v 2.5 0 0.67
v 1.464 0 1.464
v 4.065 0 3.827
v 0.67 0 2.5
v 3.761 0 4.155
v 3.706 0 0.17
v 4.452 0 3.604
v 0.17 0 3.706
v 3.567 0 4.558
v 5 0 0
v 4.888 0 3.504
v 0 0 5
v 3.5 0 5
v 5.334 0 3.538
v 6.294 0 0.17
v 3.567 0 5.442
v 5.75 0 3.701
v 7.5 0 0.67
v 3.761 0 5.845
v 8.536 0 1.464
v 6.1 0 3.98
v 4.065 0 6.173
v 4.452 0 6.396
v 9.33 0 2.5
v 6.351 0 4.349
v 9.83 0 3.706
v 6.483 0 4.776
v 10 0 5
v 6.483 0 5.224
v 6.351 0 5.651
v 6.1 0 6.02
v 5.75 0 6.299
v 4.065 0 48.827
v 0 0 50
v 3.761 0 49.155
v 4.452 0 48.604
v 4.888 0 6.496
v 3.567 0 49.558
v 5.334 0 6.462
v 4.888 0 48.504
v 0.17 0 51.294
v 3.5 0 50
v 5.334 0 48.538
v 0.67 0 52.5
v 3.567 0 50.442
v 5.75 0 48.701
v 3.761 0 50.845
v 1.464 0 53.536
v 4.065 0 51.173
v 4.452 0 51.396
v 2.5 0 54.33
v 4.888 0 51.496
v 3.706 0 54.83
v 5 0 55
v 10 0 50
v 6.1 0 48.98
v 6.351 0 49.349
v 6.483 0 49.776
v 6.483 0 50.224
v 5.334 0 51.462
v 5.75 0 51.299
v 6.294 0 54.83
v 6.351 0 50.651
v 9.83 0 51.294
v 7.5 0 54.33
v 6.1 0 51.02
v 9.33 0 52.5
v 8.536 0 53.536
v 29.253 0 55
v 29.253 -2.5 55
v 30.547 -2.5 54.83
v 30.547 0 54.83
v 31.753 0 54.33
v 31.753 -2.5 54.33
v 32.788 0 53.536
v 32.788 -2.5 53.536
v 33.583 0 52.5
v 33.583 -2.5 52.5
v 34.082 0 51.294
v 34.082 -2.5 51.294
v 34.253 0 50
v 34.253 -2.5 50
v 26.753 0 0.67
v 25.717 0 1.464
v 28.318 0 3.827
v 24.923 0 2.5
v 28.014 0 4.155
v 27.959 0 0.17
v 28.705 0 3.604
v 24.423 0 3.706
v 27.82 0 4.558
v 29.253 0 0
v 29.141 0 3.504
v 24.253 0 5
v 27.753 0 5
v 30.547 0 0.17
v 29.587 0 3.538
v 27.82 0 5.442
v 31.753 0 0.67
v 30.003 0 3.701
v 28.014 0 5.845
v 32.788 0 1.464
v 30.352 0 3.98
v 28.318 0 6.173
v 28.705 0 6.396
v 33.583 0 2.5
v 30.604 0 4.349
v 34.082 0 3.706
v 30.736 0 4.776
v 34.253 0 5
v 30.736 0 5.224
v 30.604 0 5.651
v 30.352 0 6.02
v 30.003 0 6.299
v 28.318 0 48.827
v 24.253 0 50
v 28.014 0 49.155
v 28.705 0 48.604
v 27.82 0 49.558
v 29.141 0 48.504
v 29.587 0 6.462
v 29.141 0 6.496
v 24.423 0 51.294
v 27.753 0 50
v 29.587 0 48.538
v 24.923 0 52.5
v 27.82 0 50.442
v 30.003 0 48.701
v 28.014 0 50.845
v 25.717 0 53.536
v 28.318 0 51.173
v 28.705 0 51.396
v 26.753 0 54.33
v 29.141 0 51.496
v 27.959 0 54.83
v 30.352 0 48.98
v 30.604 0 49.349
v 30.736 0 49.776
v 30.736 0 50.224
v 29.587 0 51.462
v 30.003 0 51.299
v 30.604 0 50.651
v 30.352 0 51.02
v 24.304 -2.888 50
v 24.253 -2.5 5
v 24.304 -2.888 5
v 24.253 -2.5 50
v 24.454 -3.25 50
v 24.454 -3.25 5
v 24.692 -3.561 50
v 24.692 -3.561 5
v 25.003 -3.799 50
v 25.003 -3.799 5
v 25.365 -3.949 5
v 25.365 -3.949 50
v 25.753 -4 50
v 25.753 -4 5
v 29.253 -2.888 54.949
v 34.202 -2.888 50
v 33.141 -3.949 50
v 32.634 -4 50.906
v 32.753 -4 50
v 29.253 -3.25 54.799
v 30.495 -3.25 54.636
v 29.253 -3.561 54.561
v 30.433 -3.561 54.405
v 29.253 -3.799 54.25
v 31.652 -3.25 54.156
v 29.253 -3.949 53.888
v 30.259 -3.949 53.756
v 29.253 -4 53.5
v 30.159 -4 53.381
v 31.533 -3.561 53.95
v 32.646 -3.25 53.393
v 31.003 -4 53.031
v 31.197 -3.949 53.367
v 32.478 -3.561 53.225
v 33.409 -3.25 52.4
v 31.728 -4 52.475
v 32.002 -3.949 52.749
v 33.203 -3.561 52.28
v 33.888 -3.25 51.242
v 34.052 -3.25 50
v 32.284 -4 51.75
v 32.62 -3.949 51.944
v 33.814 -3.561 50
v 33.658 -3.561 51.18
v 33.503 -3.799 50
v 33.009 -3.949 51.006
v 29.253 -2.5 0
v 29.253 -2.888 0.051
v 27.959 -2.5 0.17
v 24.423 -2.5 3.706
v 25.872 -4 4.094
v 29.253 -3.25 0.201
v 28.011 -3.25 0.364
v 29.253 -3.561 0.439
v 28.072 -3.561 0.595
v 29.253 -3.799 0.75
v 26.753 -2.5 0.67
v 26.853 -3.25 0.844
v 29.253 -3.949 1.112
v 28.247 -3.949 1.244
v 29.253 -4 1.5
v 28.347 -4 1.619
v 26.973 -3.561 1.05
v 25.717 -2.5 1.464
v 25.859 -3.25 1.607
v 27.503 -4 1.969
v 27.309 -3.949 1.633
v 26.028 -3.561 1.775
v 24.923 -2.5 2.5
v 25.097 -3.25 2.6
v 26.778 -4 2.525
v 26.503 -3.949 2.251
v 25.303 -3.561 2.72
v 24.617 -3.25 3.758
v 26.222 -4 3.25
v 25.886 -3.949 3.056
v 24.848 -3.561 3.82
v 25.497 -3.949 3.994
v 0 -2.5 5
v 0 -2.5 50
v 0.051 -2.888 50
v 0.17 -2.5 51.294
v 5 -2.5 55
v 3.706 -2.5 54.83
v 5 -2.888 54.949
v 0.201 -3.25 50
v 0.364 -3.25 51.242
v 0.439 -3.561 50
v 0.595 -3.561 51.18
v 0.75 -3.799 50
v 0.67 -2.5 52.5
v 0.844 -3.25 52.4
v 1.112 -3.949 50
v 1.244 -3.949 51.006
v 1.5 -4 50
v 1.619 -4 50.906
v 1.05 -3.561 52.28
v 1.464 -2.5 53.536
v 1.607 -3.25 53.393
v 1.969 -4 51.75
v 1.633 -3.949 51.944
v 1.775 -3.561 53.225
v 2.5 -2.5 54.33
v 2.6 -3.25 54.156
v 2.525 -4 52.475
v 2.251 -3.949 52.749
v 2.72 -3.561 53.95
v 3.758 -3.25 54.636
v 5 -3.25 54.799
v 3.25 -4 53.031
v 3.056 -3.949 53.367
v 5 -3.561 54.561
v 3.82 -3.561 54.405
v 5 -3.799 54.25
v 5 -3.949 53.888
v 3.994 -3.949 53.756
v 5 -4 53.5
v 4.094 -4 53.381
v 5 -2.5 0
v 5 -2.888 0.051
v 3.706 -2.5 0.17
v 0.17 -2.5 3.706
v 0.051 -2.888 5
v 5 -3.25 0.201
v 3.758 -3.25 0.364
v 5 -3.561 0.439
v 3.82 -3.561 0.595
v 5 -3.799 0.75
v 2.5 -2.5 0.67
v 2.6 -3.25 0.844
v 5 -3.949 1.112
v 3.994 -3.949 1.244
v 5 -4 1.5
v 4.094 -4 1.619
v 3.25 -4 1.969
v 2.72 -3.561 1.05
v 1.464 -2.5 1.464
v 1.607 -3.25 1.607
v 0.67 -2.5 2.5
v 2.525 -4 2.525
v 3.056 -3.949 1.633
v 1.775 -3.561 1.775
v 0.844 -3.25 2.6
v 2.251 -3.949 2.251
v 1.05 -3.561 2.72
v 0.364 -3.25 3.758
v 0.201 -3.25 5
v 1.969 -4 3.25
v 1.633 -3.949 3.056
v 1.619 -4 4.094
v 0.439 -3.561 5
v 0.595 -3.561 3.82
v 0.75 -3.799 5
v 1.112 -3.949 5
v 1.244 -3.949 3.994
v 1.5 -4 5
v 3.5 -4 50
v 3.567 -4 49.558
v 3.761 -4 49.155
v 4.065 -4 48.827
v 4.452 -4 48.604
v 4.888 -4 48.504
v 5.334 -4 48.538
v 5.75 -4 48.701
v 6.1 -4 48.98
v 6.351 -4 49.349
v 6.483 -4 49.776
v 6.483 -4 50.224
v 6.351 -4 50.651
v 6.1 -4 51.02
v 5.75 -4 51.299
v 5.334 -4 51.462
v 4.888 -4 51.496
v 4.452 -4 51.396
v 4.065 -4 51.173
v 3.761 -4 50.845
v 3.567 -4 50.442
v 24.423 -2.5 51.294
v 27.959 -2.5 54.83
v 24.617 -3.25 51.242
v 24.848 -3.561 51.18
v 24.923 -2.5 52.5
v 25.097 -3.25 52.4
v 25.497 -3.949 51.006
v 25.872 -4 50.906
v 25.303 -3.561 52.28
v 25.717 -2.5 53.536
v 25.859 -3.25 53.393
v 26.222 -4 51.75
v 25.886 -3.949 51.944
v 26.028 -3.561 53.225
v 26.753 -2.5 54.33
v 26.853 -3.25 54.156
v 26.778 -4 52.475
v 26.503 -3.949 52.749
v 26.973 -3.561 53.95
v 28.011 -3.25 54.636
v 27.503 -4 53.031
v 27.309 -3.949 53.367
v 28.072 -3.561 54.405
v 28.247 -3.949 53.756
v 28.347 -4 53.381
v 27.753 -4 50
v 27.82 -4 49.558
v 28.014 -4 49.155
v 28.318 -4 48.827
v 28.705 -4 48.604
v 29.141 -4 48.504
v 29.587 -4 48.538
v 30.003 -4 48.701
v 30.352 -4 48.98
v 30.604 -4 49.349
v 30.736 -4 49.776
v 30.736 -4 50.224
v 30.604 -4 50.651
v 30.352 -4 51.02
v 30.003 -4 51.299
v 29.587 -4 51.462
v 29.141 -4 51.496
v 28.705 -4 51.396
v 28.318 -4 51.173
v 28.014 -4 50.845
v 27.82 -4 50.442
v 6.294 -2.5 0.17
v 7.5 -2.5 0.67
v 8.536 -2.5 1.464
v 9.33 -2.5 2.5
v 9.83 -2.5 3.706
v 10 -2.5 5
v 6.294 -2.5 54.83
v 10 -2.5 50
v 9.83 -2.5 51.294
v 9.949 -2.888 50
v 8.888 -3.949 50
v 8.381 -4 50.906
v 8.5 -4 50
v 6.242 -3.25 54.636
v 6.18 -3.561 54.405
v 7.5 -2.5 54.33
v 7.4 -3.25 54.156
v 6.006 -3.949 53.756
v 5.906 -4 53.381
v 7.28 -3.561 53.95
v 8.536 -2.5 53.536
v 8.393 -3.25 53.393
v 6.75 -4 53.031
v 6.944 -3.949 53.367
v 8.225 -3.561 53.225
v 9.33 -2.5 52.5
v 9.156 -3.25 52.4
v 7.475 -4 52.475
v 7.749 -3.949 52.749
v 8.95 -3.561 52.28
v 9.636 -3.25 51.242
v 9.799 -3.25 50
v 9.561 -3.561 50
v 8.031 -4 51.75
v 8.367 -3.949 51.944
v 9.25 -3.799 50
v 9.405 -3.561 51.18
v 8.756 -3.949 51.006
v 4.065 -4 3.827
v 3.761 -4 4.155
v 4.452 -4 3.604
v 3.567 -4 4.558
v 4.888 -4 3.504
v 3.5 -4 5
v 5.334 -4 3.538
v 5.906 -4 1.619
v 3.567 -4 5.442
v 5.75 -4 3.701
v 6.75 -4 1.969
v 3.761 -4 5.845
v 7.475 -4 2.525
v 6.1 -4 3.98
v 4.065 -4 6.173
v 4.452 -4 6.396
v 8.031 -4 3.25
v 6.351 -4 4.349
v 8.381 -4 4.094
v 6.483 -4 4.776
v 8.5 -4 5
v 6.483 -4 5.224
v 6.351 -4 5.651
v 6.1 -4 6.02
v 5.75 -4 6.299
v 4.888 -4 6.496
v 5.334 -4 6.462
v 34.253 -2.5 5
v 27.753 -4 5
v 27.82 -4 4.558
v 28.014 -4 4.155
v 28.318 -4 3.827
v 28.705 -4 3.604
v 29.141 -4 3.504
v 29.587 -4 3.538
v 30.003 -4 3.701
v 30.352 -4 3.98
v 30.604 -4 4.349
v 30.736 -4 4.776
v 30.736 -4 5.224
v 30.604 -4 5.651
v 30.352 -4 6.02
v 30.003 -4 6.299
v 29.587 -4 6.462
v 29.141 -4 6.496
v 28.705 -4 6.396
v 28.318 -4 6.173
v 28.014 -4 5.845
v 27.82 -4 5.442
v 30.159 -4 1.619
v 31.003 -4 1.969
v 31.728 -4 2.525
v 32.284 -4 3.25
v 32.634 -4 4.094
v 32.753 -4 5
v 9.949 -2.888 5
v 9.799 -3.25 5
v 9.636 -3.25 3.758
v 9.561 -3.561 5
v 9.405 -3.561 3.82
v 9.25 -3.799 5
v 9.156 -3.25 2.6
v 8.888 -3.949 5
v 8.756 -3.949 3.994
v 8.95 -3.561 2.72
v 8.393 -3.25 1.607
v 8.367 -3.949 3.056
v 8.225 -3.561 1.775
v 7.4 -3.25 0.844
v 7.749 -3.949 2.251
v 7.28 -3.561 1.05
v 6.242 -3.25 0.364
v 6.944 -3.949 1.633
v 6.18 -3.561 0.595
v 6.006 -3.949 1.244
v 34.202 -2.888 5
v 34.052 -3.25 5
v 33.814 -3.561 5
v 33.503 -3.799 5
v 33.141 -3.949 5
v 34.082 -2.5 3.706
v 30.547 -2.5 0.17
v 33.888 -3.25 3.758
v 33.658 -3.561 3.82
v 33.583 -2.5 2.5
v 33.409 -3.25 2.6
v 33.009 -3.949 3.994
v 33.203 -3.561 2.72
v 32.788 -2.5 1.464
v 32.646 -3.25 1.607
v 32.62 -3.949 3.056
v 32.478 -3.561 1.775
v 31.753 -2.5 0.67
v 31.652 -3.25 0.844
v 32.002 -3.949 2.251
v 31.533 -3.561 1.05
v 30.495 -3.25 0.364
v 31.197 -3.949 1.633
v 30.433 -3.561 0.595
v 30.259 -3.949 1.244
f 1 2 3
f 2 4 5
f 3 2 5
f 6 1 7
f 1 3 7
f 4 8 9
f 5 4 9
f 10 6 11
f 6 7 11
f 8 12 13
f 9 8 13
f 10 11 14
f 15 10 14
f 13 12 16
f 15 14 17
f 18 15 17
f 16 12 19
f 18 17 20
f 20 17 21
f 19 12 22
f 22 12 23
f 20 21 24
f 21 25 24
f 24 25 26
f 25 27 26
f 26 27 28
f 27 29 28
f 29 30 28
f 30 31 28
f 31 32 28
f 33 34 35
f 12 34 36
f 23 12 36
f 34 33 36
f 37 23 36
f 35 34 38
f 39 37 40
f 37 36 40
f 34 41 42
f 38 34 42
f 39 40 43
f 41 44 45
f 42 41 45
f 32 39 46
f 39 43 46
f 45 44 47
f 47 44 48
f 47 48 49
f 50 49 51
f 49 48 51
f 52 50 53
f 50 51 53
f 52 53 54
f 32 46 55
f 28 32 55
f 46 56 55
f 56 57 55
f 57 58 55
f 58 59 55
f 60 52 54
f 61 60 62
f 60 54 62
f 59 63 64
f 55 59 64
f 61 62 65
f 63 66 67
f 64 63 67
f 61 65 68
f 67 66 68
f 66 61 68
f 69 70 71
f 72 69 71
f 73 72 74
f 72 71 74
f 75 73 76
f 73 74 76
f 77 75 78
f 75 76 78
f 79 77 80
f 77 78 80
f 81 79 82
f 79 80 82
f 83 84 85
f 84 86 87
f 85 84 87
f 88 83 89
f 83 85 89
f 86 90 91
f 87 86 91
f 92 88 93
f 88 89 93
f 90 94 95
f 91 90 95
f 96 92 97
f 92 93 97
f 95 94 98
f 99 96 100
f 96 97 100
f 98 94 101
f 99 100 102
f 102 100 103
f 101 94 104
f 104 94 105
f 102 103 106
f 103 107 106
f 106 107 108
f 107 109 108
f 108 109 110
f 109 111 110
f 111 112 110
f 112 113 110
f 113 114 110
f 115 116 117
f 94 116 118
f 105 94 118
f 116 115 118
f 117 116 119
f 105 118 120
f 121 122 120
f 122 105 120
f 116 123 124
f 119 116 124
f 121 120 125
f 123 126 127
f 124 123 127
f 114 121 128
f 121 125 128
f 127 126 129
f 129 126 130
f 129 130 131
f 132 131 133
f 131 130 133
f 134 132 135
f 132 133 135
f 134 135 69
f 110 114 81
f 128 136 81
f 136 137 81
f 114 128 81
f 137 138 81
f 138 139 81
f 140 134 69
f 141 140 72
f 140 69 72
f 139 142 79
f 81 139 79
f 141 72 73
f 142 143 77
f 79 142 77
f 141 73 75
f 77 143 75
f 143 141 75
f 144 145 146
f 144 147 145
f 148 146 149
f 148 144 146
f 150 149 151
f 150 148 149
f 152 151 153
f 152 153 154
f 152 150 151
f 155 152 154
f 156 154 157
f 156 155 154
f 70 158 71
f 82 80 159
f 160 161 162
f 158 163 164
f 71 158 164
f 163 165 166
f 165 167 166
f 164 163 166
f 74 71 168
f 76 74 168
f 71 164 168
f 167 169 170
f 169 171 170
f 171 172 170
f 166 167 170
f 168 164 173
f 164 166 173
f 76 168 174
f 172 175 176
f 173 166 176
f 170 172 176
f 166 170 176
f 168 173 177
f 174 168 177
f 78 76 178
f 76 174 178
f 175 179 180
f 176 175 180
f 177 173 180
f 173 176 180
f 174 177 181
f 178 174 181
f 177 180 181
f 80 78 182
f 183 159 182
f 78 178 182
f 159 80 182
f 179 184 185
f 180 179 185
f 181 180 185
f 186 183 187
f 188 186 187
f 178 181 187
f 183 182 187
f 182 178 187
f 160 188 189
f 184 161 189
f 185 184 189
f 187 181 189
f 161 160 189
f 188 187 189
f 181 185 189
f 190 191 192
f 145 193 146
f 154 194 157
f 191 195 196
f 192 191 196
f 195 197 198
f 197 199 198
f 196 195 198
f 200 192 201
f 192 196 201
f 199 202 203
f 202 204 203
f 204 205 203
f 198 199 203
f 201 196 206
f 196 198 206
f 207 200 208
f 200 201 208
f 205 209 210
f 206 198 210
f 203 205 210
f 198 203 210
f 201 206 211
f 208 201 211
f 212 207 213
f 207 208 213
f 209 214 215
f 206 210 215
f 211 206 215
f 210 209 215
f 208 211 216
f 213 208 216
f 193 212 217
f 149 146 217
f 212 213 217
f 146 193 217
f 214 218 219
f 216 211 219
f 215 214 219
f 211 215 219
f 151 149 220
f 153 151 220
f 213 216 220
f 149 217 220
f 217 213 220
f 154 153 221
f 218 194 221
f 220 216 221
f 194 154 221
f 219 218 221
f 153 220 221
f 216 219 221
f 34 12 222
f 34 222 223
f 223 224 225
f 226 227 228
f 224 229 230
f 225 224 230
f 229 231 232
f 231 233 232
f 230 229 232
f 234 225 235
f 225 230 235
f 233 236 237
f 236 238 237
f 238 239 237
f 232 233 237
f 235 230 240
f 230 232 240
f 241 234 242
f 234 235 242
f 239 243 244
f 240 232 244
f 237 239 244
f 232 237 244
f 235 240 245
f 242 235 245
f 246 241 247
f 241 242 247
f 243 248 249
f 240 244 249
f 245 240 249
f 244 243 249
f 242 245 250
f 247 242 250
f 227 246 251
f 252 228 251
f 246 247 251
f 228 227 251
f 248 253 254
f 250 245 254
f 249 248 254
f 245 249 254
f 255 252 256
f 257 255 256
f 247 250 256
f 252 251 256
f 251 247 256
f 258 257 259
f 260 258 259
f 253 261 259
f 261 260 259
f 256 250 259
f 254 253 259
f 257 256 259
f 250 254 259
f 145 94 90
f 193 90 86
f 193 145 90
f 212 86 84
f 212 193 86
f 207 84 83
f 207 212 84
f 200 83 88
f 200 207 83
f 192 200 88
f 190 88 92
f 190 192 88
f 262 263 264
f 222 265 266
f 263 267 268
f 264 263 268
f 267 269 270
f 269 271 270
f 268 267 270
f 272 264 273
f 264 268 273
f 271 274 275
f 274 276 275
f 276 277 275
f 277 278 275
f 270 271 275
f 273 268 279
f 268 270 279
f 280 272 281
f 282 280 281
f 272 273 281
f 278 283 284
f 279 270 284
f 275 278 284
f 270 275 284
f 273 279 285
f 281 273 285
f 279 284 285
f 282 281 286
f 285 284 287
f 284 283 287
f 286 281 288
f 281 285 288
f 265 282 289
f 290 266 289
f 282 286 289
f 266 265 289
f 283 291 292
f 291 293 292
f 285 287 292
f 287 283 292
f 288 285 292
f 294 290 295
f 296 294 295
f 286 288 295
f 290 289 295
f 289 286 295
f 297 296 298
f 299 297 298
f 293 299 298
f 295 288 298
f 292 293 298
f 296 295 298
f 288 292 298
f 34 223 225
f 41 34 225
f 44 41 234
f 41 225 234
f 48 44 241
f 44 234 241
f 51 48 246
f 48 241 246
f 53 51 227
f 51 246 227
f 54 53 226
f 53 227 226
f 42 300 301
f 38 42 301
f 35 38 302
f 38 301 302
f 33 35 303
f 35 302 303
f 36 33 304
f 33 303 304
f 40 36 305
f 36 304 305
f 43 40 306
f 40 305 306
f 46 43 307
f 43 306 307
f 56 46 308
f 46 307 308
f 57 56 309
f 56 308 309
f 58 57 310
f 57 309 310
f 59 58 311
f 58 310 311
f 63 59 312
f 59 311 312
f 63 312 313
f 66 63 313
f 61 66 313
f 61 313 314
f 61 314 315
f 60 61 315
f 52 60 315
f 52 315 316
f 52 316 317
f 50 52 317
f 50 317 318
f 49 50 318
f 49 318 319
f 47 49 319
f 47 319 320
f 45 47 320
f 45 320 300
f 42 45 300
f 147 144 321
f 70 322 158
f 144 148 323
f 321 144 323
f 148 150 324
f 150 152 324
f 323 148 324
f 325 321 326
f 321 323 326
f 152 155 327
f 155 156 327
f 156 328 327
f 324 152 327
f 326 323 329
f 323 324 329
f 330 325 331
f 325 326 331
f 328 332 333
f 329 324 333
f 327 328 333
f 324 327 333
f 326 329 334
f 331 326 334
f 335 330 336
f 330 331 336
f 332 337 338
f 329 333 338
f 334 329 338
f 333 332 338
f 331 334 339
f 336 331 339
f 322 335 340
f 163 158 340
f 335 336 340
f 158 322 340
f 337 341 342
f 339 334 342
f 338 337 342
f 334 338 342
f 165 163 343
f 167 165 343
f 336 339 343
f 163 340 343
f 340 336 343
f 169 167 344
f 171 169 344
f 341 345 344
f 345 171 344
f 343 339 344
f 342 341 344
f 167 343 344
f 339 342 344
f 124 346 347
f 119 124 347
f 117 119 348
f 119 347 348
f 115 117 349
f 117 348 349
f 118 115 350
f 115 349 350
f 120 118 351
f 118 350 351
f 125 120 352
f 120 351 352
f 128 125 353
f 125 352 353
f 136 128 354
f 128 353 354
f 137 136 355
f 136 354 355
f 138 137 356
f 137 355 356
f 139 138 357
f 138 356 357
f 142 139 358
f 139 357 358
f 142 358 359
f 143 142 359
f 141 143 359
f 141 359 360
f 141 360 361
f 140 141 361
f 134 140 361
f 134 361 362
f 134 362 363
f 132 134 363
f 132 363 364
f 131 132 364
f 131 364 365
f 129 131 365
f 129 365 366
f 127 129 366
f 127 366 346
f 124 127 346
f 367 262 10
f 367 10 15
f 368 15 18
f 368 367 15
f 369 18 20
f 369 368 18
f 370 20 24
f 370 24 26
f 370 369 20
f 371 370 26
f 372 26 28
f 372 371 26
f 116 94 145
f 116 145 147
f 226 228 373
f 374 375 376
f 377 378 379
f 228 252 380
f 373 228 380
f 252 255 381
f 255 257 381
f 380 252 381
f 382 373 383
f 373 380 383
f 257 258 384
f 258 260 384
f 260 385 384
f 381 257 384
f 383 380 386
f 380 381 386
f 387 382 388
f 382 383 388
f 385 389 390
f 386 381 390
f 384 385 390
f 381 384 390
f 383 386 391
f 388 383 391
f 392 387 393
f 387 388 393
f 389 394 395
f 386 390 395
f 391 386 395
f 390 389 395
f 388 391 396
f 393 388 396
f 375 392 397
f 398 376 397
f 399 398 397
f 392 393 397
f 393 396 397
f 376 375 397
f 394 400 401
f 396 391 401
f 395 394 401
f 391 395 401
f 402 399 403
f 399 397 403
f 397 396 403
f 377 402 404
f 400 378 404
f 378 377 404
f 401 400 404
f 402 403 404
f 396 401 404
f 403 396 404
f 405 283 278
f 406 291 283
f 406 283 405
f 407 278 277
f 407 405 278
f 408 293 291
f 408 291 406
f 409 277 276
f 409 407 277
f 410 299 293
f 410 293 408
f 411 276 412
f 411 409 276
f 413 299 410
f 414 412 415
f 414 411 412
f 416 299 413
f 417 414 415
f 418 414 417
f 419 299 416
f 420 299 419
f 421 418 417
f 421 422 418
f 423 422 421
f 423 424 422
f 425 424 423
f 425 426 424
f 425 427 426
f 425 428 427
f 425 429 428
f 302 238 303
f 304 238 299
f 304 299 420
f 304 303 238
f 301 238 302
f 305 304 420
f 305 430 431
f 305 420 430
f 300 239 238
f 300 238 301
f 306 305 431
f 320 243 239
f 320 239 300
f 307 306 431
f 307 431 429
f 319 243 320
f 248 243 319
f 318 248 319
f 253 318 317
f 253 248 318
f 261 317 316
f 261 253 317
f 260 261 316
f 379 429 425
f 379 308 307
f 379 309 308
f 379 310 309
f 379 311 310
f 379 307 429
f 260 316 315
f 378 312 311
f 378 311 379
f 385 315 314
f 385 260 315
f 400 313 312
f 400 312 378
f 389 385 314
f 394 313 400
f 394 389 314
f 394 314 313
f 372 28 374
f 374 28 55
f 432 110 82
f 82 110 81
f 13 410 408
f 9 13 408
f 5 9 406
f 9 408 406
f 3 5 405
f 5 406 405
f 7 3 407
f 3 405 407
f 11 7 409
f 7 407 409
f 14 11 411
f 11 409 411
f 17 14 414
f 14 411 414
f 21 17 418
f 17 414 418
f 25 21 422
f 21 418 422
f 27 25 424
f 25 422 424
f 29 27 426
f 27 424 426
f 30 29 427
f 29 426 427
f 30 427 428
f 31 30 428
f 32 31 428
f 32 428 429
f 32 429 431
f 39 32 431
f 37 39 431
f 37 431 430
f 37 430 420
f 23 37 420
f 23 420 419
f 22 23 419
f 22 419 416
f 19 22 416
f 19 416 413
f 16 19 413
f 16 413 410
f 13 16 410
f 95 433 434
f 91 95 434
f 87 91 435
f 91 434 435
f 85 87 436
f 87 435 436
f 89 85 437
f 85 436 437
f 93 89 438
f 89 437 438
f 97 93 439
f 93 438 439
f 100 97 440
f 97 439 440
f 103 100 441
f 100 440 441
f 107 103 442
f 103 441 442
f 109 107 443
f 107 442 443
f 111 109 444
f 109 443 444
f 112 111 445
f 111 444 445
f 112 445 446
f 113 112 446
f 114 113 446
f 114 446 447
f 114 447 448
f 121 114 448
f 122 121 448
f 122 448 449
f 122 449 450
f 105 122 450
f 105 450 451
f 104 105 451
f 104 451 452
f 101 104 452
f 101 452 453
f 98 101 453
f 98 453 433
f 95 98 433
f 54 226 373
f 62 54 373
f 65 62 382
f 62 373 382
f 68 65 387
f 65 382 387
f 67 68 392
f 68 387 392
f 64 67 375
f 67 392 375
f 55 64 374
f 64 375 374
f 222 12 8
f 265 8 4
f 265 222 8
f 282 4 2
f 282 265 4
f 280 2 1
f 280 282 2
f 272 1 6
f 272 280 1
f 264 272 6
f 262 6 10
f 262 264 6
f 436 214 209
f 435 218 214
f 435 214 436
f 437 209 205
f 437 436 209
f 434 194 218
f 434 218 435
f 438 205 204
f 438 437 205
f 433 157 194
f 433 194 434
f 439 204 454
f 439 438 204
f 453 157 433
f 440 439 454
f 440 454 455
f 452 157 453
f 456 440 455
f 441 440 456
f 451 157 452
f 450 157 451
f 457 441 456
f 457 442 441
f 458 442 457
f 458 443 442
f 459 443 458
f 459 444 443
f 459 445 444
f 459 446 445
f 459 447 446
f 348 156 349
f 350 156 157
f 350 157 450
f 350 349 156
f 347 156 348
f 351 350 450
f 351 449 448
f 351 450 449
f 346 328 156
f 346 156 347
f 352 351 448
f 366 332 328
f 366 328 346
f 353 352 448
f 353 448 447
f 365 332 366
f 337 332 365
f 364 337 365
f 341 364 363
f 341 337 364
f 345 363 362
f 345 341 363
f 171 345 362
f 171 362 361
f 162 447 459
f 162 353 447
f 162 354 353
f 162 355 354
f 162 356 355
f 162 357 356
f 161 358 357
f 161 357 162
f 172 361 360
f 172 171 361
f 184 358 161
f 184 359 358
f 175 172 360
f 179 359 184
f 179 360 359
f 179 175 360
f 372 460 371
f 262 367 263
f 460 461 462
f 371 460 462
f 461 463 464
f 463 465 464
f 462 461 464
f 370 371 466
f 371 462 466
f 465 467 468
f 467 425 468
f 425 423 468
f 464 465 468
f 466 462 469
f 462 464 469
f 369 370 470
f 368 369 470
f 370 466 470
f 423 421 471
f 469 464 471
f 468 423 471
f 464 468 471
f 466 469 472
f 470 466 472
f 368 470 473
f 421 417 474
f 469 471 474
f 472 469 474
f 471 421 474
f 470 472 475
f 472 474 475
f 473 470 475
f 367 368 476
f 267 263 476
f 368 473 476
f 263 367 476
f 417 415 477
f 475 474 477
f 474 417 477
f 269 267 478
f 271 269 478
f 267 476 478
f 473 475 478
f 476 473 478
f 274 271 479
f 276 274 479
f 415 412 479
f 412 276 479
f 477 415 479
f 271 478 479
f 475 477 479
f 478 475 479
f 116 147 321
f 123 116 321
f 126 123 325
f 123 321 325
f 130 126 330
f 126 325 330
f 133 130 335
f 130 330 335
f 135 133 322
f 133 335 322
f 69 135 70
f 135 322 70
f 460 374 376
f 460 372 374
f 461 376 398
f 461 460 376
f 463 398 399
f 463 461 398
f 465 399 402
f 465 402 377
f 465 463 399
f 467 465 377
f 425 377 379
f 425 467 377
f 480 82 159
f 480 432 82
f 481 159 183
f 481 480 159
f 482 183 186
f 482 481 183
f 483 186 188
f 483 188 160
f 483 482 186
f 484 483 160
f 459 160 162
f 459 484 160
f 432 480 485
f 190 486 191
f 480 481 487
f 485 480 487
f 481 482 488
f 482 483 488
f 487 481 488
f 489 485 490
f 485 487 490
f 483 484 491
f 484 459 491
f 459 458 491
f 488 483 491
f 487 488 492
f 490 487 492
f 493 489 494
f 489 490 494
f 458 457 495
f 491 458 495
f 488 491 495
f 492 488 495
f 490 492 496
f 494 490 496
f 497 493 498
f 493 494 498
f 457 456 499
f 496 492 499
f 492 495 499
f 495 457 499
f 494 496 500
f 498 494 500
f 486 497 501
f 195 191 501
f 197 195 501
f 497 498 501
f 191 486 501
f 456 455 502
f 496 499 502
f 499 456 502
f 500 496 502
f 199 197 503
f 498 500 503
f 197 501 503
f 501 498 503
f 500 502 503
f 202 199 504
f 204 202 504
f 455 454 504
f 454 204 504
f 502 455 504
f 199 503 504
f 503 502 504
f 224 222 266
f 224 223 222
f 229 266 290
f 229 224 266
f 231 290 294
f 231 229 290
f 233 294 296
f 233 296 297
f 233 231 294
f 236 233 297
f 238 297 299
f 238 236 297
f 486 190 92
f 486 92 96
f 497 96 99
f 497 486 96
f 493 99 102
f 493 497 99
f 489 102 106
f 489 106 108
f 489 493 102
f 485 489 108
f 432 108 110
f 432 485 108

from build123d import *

# Parameters (mm, degrees)
F0_W     = 10
F0_H     = 55
F1_DEPTH = 4
F3_D     = 3
F3_2_D   = 3
F4_R     = 4.99999
F4_2_R   = 4.99999
F5_R     = 1.5
F5_2_R   = 1.5


# Not quite as in the source:
# - a fillet or chamfer is up to 0.001 mm smaller than in the source, because OpenCascade refuses the exact size


with BuildPart() as f1:
    # F0 (on Front) → F1 (new body)
    with BuildSketch(Plane.XZ):
        with Locations((5, 27.5)):
            Rectangle(F0_W, F0_H)
    extrude(amount=F1_DEPTH)

    # F3 (through all)
    with Locations(Plane(origin=(0, 0, 0), x_dir=(1, 0, 0), z_dir=(0, 1, 0))):
        with Locations((5, -50), (29.2528691568, -50), (5, -5), (29.2528691568, -5)):
            Hole(F3_D / 2)

    # F4 (radius 5 in the source; OpenCascade refuses exactly that, so slightly less here)
    f4_edges = [f1.edges().sort_by_distance(p)[0] for p in [
        (0, -2, 55),
        (0, -2, 0),
        (10, -2, 0),
        (10, -2, 55),
    ]]
    fillet(f4_edges, radius=F4_R)

    # F5
    f5_edges = [f1.edges().sort_by_distance(p)[0] for p in [
        (0, -4, 27.5),
    ]]
    fillet(f5_edges, radius=F5_R)


with BuildPart() as f1b:
    # F0 (on Front) → F1, piece 2 (new body)
    with BuildSketch(Plane.XZ):
        with Locations((29.2528691568, 27.5)):
            Rectangle(F0_W, F0_H)
    extrude(amount=F1_DEPTH)

    # F3#2 (through all)
    with Locations(Plane(origin=(0, 0, 0), x_dir=(1, 0, 0), z_dir=(0, 1, 0))):
        with Locations((5, -50), (29.2528691568, -50), (5, -5), (29.2528691568, -5)):
            Hole(F3_2_D / 2)

    # F4#2 (radius 5 in the source; OpenCascade refuses exactly that, so slightly less here)
    f4_2_edges = [f1b.edges().sort_by_distance(p)[0] for p in [
        (24.252869, -2, 55),
        (24.252869, -2, 0),
        (34.252869, -2, 0),
        (34.252869, -2, 55),
    ]]
    fillet(f4_2_edges, radius=F4_2_R)

    # F5#2
    f5_2_edges = [f1b.edges().sort_by_distance(p)[0] for p in [
        (24.252869, -4, 27.5),
    ]]
    fillet(f5_2_edges, radius=F5_2_R)


solid = Compound([f1.part, f1b.part])
